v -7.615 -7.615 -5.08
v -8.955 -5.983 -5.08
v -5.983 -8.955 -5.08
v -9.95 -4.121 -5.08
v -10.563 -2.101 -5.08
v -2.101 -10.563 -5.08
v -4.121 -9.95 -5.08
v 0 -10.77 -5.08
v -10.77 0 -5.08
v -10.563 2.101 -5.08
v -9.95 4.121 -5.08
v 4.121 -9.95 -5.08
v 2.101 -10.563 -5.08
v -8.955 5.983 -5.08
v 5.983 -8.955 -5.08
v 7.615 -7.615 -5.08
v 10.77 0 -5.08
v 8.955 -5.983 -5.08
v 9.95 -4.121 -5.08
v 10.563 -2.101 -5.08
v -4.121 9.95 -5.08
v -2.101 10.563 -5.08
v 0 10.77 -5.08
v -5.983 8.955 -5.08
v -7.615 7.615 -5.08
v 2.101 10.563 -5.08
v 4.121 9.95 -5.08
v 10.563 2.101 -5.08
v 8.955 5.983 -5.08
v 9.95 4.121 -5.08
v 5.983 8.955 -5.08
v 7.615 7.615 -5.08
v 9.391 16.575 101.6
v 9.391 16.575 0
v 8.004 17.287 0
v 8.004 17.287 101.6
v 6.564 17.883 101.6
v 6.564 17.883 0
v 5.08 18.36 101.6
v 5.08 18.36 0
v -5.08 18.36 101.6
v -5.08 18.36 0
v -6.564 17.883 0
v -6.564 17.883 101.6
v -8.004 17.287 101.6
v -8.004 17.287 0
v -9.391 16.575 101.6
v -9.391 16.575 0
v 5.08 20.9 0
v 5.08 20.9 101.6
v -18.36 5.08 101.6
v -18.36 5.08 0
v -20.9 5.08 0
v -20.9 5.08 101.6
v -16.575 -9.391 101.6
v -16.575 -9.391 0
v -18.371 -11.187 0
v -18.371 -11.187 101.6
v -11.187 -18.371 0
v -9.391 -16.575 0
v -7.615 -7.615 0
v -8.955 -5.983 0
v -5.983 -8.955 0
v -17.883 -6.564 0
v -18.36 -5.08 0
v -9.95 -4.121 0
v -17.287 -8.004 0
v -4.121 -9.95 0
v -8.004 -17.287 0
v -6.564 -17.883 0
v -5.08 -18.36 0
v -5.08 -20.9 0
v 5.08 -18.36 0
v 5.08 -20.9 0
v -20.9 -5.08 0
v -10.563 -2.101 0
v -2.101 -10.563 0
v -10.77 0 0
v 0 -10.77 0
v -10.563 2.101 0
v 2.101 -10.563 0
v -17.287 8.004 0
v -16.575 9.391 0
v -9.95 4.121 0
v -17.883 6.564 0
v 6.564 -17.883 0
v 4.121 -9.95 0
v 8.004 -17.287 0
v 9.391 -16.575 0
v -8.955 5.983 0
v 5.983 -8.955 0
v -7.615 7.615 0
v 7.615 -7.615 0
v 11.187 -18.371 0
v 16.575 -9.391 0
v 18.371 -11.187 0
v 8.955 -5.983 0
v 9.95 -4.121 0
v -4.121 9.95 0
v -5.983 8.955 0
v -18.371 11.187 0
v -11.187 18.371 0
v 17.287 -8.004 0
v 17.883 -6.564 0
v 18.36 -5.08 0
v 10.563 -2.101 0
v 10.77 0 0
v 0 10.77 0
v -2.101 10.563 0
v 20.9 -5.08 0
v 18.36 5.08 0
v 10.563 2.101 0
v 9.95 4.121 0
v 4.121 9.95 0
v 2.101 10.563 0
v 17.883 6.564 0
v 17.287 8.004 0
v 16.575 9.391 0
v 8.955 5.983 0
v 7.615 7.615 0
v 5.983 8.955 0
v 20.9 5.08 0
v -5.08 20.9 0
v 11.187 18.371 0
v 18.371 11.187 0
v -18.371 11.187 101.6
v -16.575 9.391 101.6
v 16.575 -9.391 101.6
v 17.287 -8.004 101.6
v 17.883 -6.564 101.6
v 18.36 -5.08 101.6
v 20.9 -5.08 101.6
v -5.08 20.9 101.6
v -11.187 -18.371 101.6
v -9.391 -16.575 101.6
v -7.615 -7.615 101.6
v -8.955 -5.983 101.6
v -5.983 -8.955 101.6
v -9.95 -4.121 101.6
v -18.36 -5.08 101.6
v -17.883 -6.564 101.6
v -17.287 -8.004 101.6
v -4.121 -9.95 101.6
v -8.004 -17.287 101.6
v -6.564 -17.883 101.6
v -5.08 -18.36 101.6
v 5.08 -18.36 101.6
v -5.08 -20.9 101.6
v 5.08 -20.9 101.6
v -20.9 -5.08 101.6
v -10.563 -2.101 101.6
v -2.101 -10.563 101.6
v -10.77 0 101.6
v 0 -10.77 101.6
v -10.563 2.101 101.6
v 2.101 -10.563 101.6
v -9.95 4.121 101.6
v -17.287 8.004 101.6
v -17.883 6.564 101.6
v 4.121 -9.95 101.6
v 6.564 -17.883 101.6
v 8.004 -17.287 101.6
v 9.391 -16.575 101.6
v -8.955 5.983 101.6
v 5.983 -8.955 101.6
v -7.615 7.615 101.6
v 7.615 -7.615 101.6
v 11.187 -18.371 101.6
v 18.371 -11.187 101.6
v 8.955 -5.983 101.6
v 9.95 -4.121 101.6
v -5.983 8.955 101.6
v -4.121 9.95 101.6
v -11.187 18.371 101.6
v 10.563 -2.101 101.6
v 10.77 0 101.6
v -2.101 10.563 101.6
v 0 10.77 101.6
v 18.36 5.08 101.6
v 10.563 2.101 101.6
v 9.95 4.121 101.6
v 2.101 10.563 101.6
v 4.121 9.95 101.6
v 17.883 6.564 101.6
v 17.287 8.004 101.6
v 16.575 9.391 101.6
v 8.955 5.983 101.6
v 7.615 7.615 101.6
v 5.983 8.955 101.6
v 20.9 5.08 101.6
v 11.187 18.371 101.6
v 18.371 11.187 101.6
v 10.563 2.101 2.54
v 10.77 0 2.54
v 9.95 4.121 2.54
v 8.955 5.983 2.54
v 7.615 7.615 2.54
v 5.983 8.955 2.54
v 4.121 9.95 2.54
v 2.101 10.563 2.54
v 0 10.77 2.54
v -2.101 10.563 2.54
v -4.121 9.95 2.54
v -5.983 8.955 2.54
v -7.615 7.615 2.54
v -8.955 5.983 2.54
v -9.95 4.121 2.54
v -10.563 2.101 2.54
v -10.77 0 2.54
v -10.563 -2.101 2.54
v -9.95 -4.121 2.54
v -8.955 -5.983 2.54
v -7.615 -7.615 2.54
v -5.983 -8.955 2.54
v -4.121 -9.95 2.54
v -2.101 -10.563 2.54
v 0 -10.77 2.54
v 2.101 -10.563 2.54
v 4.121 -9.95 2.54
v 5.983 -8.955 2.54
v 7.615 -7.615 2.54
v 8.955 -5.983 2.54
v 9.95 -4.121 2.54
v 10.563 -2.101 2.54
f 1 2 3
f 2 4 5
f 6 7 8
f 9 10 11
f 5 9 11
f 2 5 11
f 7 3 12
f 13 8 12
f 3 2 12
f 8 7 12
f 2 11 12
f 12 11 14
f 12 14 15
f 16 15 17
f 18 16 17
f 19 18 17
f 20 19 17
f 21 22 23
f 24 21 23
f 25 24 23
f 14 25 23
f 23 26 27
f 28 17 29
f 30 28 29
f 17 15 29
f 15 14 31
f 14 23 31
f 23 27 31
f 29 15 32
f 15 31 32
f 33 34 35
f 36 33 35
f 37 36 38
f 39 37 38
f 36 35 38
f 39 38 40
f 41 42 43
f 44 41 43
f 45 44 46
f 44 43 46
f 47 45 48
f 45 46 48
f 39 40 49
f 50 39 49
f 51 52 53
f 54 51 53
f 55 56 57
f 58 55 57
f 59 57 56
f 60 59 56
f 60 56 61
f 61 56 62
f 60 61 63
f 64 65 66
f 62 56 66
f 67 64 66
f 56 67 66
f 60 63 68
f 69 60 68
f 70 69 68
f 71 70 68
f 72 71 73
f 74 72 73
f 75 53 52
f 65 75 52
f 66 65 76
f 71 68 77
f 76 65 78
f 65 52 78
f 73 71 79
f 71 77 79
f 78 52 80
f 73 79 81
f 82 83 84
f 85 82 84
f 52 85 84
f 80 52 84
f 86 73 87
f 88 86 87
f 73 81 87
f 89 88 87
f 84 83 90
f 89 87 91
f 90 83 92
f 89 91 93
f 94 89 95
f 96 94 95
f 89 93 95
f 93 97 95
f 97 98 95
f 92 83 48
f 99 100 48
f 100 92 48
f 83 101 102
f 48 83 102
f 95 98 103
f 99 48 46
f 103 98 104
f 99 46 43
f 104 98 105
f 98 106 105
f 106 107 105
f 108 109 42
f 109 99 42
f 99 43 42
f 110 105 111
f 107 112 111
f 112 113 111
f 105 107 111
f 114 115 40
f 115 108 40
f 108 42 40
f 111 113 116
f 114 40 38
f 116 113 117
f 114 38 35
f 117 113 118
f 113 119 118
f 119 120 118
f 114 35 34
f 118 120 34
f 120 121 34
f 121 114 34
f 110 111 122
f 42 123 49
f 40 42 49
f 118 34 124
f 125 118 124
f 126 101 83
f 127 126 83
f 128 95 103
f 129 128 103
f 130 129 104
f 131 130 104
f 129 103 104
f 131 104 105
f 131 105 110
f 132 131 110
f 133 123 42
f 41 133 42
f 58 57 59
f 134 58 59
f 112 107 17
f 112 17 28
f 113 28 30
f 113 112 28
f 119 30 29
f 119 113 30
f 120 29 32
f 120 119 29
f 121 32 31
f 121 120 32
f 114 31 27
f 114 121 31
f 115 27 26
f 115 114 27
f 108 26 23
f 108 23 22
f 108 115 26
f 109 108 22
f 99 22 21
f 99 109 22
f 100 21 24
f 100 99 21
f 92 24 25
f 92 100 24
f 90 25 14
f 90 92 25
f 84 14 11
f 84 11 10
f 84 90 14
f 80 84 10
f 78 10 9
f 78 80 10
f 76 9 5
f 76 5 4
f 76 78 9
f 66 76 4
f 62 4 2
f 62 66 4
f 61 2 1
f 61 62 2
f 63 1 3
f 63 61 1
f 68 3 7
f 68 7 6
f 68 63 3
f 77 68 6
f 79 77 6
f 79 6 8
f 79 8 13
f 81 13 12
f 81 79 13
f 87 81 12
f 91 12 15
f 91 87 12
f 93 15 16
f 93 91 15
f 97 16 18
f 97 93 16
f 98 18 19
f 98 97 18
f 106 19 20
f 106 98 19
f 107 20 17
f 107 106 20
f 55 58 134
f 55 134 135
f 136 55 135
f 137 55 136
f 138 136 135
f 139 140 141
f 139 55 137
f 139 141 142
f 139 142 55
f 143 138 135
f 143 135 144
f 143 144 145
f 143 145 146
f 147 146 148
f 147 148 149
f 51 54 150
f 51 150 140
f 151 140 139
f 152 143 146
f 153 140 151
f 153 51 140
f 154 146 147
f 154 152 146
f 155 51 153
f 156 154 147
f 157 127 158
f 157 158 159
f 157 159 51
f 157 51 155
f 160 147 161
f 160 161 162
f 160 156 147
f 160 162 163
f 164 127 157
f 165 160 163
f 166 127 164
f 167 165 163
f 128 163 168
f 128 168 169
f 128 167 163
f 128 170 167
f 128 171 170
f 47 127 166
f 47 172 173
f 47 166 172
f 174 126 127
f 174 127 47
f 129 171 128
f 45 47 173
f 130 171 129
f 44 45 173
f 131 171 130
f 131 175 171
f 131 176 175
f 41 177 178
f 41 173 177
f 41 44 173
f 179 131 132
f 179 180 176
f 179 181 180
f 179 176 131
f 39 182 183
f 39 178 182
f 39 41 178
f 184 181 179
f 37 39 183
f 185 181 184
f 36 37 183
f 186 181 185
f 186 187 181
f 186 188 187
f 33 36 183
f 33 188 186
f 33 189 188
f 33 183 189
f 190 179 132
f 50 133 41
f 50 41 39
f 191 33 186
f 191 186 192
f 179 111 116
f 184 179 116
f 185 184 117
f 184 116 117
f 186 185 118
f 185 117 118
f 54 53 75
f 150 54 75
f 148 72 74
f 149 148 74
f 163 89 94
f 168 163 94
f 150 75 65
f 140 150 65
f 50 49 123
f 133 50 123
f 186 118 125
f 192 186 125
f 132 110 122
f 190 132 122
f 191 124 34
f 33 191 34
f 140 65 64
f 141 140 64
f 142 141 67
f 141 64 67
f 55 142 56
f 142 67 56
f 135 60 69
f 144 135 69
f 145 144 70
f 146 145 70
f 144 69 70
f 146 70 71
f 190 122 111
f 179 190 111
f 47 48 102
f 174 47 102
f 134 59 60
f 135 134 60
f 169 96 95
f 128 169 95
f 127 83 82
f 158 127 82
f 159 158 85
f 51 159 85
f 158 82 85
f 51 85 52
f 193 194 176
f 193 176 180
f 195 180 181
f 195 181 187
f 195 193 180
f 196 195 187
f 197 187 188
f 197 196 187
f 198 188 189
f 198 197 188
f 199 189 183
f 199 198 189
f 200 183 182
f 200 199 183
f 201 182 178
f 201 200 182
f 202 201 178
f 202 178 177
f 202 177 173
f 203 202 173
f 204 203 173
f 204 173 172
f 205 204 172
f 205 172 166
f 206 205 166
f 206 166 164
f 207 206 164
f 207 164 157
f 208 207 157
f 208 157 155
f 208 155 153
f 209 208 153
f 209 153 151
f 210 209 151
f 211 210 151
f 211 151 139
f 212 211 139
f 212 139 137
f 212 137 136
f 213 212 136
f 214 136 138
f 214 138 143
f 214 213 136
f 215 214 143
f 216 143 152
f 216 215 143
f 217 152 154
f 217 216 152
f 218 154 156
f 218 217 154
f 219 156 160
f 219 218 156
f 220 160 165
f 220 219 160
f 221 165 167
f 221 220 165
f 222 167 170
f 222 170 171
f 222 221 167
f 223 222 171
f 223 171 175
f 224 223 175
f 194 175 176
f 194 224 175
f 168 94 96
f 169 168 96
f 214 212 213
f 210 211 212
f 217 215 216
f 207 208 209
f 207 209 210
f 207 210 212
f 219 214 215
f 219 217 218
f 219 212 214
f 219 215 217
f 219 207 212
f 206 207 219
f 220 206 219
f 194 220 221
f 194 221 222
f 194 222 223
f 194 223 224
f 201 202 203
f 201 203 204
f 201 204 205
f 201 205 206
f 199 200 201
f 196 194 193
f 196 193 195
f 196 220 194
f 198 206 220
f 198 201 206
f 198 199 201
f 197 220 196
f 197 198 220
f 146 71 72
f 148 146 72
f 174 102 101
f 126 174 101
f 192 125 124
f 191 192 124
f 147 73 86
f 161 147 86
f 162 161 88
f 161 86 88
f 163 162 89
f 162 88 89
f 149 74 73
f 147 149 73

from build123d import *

# Parameters (mm, degrees)
F0_R     = 10.7696
F1_DEPTH = 2.54
F2_DEPTH = 101.6
F3_DEPTH = 5.08


with BuildPart() as f1:
    # F0 (on Top) → F1 (new body)
    with BuildSketch(Plane.XY):
        Circle(F0_R)
    extrude(amount=F1_DEPTH)

    # F0 (on Top) → F2 (join)
    with BuildSketch(Plane.XY):
        with BuildLine():
            Line((5.08, 20.900177), (-5.08, 20.900177))
            Line((-5.08, 20.900177), (-5.08, 18.360177))
            ThreePointArc((-5.08, 18.360177), (-7.290119, 17.599905), (-9.390503, 16.574708))
            Line((-9.390503, 16.574708), (-11.186554, 18.370759))
            Line((-11.186554, 18.370759), (-18.370759, 11.186554))
            Line((-18.370759, 11.186554), (-16.574708, 9.390503))
            ThreePointArc((-16.574708, 9.390503), (-17.599905, 7.290119), (-18.360177, 5.08))
            Line((-18.360177, 5.08), (-20.900177, 5.08))
            Line((-20.900177, 5.08), (-20.900177, -5.08))
            Line((-20.900177, -5.08), (-18.360177, -5.08))
            ThreePointArc((-18.360177, -5.08), (-17.599905, -7.290119), (-16.574708, -9.390503))
            Line((-16.574708, -9.390503), (-18.370759, -11.186554))
            Line((-18.370759, -11.186554), (-11.186554, -18.370759))
            Line((-11.186554, -18.370759), (-9.390503, -16.574708))
            ThreePointArc((-9.390503, -16.574708), (-7.290119, -17.599905), (-5.08, -18.360177))
            Line((-5.08, -18.360177), (-5.08, -20.900177))
            Line((-5.08, -20.900177), (5.08, -20.900177))
            Line((5.08, -20.900177), (5.08, -18.360177))
            ThreePointArc((5.08, -18.360177), (7.290119, -17.599905), (9.390503, -16.574708))
            Line((9.390503, -16.574708), (11.186554, -18.370759))
            Line((11.186554, -18.370759), (18.370759, -11.186554))
            Line((18.370759, -11.186554), (16.574708, -9.390503))
            ThreePointArc((16.574708, -9.390503), (17.599905, -7.290119), (18.360177, -5.08))
            Line((18.360177, -5.08), (20.900177, -5.08))
            Line((20.900177, -5.08), (20.900177, 5.08))
            Line((20.900177, 5.08), (18.360177, 5.08))
            ThreePointArc((18.360177, 5.08), (17.599905, 7.290119), (16.574708, 9.390503))
            Line((16.574708, 9.390503), (18.370759, 11.186554))
            Line((18.370759, 11.186554), (11.186554, 18.370759))
            Line((11.186554, 18.370759), (9.390503, 16.574708))
            ThreePointArc((9.390503, 16.574708), (7.290119, 17.599905), (5.08, 18.360177))
            Line((5.08, 18.360177), (5.08, 20.900177))
        make_face()
        Circle(F0_R, mode=Mode.SUBTRACT)
    extrude(amount=F2_DEPTH)

    # F0 (on Top) → F3 (join)
    with BuildSketch(Plane.XY):
        Circle(F0_R)
    extrude(amount=-F3_DEPTH)


solid = f1.part
